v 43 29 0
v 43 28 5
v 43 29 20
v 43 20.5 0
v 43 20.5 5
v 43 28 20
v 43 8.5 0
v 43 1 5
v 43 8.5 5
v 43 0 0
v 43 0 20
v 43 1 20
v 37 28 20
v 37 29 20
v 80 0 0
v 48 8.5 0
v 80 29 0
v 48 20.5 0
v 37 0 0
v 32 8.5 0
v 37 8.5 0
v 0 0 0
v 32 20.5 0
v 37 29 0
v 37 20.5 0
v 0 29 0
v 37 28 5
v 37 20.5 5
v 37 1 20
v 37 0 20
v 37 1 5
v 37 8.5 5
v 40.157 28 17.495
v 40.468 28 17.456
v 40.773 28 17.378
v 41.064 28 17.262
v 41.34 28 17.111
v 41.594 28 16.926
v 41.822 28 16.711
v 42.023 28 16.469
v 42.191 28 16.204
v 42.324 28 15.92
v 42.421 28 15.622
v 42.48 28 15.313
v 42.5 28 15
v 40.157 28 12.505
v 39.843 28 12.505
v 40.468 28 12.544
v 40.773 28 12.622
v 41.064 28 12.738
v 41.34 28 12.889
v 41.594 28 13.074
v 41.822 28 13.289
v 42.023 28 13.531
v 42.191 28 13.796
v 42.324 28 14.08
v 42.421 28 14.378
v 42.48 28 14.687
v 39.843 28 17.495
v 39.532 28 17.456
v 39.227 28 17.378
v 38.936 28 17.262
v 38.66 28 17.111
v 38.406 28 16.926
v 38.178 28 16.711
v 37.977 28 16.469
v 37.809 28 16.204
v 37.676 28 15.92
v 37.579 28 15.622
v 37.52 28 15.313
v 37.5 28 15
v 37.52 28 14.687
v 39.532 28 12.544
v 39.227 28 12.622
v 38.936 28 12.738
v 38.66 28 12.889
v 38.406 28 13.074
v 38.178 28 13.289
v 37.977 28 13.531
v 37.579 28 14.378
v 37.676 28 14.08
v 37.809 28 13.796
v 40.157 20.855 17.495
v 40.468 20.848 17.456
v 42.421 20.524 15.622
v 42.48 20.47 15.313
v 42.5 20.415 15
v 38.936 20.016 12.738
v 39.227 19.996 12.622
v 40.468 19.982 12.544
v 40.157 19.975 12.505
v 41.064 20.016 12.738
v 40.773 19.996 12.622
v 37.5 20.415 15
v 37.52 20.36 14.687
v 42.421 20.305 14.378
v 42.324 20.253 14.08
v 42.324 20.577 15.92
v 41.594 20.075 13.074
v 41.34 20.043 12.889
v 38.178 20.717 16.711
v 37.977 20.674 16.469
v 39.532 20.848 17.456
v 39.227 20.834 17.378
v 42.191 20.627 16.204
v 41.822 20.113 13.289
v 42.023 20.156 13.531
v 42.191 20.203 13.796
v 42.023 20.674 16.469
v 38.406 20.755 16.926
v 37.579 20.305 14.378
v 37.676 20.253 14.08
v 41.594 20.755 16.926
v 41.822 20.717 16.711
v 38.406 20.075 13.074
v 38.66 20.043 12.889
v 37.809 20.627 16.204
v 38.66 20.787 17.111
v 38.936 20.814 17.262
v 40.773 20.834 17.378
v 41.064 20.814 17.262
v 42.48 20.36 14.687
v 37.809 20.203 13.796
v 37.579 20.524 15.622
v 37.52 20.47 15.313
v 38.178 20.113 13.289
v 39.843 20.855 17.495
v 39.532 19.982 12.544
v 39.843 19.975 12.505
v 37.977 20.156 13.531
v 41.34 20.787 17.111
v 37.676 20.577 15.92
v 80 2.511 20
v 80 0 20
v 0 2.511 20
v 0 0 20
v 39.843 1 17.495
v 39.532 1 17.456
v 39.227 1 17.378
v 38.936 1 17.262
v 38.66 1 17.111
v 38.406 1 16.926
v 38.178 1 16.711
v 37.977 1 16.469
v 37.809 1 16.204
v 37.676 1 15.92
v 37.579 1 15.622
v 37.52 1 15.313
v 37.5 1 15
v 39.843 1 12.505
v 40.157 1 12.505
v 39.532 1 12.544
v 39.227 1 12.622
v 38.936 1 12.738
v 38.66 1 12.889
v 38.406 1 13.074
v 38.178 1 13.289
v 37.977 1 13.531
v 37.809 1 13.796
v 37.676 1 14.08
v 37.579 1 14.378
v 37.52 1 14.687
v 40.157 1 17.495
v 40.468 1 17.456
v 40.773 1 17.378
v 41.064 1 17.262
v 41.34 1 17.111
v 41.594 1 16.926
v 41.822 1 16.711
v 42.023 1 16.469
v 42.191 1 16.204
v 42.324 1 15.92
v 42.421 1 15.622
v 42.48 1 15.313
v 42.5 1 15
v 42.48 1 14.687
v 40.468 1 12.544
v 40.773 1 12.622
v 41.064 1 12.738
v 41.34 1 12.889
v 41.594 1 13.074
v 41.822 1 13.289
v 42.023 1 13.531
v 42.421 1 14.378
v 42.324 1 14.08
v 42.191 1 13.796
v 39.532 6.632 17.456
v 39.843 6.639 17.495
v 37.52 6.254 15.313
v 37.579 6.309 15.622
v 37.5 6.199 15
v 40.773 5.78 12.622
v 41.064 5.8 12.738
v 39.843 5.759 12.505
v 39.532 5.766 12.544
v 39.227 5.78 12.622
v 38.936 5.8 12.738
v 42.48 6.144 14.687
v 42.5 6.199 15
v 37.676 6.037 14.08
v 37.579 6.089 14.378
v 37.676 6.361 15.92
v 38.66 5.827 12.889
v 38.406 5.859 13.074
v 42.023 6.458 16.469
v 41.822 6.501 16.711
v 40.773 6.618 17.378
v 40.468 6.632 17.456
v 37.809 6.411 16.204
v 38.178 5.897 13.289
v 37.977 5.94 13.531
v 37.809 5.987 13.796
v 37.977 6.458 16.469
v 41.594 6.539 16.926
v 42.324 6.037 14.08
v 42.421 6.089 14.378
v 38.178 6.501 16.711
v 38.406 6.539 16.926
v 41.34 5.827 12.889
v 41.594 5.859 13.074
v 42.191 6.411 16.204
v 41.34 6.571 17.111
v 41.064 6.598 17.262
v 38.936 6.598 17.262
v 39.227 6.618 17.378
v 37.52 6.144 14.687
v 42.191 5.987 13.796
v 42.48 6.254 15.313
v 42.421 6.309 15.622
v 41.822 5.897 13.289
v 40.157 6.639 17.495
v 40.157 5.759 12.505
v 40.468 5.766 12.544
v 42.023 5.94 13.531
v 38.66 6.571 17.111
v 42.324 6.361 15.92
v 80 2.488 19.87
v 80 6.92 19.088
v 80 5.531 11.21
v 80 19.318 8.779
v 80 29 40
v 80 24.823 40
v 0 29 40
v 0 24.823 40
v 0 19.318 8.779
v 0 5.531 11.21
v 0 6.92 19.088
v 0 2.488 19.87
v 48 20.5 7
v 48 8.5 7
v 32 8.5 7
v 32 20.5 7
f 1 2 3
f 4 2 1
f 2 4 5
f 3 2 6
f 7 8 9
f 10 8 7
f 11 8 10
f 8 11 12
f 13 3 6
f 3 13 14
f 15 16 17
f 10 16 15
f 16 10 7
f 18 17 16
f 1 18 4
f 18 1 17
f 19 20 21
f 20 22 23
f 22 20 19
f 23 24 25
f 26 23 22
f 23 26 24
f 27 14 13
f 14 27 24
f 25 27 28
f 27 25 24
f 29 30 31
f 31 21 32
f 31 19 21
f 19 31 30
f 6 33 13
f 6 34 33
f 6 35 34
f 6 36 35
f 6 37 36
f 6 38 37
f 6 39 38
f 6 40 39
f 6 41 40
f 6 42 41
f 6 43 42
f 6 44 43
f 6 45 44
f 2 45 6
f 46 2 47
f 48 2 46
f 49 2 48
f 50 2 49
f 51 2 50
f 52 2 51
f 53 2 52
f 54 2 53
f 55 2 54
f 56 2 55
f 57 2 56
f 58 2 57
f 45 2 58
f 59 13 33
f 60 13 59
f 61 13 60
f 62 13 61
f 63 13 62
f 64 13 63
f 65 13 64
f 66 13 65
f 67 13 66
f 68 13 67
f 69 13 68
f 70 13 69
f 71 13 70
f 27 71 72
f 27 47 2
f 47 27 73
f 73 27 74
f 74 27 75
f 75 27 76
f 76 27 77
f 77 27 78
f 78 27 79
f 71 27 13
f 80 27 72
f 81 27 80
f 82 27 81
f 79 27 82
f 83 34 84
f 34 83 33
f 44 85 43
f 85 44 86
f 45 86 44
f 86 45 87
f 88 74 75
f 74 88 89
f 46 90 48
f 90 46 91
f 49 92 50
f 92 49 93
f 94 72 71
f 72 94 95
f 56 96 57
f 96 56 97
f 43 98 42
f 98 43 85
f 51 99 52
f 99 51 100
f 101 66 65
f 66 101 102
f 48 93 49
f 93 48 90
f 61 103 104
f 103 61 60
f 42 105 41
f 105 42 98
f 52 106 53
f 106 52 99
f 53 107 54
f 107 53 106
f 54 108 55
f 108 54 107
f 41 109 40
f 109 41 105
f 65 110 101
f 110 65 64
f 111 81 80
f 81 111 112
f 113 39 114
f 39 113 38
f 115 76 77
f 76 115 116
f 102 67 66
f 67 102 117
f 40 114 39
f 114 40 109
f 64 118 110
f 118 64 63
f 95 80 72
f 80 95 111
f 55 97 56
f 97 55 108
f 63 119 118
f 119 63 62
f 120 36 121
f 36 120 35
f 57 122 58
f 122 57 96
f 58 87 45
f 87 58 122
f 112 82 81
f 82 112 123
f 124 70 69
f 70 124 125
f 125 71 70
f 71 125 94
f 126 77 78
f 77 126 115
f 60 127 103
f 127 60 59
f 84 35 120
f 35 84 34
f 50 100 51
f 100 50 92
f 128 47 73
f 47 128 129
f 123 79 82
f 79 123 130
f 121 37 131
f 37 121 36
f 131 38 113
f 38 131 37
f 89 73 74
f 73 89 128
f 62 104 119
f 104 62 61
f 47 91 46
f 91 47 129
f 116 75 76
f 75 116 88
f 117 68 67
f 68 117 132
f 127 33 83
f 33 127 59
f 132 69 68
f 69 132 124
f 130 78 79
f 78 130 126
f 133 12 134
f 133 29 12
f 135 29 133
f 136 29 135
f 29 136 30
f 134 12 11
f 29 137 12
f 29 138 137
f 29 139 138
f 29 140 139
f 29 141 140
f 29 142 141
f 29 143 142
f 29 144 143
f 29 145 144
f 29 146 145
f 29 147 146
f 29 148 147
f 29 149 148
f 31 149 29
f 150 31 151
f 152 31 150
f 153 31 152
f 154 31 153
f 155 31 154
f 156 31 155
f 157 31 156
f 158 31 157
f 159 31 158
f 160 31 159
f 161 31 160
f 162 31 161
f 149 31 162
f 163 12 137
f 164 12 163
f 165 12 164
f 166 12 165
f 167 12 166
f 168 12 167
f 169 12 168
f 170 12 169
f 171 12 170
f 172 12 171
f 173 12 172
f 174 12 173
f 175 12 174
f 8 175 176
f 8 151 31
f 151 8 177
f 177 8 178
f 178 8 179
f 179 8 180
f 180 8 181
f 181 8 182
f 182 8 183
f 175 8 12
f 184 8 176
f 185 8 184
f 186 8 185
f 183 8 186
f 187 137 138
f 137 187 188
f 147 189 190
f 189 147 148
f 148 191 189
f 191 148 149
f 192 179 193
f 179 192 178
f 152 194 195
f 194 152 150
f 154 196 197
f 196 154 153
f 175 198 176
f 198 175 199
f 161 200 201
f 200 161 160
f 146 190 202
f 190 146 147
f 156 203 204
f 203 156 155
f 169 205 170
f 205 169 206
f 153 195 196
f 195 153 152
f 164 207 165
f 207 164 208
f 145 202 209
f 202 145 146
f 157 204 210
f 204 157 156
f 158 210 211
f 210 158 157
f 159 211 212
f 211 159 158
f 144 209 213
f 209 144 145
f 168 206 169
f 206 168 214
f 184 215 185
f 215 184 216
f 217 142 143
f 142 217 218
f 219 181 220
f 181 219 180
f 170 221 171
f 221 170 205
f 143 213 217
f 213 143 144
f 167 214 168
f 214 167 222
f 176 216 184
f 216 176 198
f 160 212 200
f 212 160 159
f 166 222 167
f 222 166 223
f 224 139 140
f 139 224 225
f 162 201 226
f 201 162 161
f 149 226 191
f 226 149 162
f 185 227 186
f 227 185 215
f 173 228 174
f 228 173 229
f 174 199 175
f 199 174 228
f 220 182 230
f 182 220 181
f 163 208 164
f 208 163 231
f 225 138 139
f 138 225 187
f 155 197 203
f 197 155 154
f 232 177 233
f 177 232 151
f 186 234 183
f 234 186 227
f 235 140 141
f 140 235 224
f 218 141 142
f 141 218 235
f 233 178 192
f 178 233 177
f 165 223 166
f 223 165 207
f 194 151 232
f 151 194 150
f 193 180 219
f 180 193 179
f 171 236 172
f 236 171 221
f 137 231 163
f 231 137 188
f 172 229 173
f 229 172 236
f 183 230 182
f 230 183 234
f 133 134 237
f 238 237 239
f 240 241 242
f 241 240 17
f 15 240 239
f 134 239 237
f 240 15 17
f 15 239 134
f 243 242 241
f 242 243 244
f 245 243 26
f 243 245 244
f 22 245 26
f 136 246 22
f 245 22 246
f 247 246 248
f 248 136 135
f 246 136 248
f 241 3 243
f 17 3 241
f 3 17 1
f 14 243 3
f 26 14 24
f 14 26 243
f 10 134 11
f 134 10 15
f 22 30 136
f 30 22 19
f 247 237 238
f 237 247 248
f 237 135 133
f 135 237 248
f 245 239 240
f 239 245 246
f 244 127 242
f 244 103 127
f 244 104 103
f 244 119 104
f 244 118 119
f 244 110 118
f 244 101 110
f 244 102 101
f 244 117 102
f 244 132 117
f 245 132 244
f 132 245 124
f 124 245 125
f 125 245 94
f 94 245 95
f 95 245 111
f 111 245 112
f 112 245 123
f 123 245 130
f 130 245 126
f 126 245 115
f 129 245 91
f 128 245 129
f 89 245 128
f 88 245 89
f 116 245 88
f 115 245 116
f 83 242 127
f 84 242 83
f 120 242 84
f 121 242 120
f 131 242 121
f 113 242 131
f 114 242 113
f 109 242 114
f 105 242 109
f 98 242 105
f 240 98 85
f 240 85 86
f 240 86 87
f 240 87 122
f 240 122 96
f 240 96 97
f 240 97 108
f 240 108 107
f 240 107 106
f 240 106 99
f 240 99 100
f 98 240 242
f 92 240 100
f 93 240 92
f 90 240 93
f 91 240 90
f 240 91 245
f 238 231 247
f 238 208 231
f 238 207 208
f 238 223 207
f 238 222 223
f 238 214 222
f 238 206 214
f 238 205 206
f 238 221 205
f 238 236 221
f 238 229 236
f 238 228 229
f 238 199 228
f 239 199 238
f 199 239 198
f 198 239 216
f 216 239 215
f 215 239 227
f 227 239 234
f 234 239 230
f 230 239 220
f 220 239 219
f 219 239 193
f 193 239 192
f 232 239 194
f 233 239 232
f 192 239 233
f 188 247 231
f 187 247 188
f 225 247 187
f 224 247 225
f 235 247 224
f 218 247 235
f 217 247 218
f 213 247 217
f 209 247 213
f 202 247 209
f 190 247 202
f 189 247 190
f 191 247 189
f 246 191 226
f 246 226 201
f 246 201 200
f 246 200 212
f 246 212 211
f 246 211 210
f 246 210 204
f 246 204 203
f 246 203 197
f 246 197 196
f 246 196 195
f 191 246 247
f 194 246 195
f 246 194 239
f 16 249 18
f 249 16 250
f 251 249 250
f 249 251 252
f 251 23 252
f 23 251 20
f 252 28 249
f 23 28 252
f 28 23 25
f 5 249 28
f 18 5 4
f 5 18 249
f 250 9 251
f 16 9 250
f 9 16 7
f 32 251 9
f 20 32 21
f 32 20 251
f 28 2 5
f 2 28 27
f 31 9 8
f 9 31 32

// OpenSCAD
$fn = 50;

// Mudar os parametros abaixo
larguraDock = 80;
espessuraDevice = 14;

// Não alterar a partir daqui
anguloDevice = 10;
compensacaoAngular = 4;
profundidadeBase = espessuraDevice + 15;
alturaBaseFrente = 20;
alturaBaseEncosto = 40;
alturaRecorteDevice = 12;
diametroLeds = 5;


base();
//recorteSensores();

module base(){
    //Base
    difference(){
        cube([larguraDock, profundidadeBase, alturaBaseEncosto]);
        // Recorte do device
        rotate([-anguloDevice,0,0]) translate([-1,-1 ,alturaBaseFrente])cube([larguraDock + 2,profundidadeBase / 2,alturaBaseEncosto]);
        //Recortes da parte frontal
        translate([-1,-1 ,alturaBaseFrente])cube([larguraDock + 2,profundidadeBase / 2,alturaBaseEncosto]);   
        rotate([-anguloDevice,0,0]) translate([-1,(profundidadeBase -espessuraDevice) / 2 - compensacaoAngular ,alturaRecorteDevice]) cube([larguraDock + 2, espessuraDevice, alturaBaseEncosto]);
        //Recorte dos sensores
        translate([(larguraDock - 6) / 2,profundidadeBase - 10, 0 ]) recorteSensores();
        
        translate([(larguraDock + 6) / 2,10, 0 ]) rotate([0,0,180]) recorteSensores();
        
        // recorte Led
    translate([(larguraDock - 16) / 2,(profundidadeBase- 12) / 2]) cube([16,12,7]);
        
        translate([(larguraDock - 6) / 2,0, 0]) cube([6,profundidadeBase,5]);
    }
    
    
    
}

module recorteSensores(){
    
    largura = 6;
    altura = 20;
    alturaLed = 15;
    anguloLeds = 0;
    
    // diametro led = 5
    // tamanho led = 12
    
    translate([0,9,0]) cube([largura,12,altura]);
    
    translate([largura / 2,12,alturaLed]) rotate([90,0,anguloLeds]) cylinder(h=15, d=diametroLeds);
}
